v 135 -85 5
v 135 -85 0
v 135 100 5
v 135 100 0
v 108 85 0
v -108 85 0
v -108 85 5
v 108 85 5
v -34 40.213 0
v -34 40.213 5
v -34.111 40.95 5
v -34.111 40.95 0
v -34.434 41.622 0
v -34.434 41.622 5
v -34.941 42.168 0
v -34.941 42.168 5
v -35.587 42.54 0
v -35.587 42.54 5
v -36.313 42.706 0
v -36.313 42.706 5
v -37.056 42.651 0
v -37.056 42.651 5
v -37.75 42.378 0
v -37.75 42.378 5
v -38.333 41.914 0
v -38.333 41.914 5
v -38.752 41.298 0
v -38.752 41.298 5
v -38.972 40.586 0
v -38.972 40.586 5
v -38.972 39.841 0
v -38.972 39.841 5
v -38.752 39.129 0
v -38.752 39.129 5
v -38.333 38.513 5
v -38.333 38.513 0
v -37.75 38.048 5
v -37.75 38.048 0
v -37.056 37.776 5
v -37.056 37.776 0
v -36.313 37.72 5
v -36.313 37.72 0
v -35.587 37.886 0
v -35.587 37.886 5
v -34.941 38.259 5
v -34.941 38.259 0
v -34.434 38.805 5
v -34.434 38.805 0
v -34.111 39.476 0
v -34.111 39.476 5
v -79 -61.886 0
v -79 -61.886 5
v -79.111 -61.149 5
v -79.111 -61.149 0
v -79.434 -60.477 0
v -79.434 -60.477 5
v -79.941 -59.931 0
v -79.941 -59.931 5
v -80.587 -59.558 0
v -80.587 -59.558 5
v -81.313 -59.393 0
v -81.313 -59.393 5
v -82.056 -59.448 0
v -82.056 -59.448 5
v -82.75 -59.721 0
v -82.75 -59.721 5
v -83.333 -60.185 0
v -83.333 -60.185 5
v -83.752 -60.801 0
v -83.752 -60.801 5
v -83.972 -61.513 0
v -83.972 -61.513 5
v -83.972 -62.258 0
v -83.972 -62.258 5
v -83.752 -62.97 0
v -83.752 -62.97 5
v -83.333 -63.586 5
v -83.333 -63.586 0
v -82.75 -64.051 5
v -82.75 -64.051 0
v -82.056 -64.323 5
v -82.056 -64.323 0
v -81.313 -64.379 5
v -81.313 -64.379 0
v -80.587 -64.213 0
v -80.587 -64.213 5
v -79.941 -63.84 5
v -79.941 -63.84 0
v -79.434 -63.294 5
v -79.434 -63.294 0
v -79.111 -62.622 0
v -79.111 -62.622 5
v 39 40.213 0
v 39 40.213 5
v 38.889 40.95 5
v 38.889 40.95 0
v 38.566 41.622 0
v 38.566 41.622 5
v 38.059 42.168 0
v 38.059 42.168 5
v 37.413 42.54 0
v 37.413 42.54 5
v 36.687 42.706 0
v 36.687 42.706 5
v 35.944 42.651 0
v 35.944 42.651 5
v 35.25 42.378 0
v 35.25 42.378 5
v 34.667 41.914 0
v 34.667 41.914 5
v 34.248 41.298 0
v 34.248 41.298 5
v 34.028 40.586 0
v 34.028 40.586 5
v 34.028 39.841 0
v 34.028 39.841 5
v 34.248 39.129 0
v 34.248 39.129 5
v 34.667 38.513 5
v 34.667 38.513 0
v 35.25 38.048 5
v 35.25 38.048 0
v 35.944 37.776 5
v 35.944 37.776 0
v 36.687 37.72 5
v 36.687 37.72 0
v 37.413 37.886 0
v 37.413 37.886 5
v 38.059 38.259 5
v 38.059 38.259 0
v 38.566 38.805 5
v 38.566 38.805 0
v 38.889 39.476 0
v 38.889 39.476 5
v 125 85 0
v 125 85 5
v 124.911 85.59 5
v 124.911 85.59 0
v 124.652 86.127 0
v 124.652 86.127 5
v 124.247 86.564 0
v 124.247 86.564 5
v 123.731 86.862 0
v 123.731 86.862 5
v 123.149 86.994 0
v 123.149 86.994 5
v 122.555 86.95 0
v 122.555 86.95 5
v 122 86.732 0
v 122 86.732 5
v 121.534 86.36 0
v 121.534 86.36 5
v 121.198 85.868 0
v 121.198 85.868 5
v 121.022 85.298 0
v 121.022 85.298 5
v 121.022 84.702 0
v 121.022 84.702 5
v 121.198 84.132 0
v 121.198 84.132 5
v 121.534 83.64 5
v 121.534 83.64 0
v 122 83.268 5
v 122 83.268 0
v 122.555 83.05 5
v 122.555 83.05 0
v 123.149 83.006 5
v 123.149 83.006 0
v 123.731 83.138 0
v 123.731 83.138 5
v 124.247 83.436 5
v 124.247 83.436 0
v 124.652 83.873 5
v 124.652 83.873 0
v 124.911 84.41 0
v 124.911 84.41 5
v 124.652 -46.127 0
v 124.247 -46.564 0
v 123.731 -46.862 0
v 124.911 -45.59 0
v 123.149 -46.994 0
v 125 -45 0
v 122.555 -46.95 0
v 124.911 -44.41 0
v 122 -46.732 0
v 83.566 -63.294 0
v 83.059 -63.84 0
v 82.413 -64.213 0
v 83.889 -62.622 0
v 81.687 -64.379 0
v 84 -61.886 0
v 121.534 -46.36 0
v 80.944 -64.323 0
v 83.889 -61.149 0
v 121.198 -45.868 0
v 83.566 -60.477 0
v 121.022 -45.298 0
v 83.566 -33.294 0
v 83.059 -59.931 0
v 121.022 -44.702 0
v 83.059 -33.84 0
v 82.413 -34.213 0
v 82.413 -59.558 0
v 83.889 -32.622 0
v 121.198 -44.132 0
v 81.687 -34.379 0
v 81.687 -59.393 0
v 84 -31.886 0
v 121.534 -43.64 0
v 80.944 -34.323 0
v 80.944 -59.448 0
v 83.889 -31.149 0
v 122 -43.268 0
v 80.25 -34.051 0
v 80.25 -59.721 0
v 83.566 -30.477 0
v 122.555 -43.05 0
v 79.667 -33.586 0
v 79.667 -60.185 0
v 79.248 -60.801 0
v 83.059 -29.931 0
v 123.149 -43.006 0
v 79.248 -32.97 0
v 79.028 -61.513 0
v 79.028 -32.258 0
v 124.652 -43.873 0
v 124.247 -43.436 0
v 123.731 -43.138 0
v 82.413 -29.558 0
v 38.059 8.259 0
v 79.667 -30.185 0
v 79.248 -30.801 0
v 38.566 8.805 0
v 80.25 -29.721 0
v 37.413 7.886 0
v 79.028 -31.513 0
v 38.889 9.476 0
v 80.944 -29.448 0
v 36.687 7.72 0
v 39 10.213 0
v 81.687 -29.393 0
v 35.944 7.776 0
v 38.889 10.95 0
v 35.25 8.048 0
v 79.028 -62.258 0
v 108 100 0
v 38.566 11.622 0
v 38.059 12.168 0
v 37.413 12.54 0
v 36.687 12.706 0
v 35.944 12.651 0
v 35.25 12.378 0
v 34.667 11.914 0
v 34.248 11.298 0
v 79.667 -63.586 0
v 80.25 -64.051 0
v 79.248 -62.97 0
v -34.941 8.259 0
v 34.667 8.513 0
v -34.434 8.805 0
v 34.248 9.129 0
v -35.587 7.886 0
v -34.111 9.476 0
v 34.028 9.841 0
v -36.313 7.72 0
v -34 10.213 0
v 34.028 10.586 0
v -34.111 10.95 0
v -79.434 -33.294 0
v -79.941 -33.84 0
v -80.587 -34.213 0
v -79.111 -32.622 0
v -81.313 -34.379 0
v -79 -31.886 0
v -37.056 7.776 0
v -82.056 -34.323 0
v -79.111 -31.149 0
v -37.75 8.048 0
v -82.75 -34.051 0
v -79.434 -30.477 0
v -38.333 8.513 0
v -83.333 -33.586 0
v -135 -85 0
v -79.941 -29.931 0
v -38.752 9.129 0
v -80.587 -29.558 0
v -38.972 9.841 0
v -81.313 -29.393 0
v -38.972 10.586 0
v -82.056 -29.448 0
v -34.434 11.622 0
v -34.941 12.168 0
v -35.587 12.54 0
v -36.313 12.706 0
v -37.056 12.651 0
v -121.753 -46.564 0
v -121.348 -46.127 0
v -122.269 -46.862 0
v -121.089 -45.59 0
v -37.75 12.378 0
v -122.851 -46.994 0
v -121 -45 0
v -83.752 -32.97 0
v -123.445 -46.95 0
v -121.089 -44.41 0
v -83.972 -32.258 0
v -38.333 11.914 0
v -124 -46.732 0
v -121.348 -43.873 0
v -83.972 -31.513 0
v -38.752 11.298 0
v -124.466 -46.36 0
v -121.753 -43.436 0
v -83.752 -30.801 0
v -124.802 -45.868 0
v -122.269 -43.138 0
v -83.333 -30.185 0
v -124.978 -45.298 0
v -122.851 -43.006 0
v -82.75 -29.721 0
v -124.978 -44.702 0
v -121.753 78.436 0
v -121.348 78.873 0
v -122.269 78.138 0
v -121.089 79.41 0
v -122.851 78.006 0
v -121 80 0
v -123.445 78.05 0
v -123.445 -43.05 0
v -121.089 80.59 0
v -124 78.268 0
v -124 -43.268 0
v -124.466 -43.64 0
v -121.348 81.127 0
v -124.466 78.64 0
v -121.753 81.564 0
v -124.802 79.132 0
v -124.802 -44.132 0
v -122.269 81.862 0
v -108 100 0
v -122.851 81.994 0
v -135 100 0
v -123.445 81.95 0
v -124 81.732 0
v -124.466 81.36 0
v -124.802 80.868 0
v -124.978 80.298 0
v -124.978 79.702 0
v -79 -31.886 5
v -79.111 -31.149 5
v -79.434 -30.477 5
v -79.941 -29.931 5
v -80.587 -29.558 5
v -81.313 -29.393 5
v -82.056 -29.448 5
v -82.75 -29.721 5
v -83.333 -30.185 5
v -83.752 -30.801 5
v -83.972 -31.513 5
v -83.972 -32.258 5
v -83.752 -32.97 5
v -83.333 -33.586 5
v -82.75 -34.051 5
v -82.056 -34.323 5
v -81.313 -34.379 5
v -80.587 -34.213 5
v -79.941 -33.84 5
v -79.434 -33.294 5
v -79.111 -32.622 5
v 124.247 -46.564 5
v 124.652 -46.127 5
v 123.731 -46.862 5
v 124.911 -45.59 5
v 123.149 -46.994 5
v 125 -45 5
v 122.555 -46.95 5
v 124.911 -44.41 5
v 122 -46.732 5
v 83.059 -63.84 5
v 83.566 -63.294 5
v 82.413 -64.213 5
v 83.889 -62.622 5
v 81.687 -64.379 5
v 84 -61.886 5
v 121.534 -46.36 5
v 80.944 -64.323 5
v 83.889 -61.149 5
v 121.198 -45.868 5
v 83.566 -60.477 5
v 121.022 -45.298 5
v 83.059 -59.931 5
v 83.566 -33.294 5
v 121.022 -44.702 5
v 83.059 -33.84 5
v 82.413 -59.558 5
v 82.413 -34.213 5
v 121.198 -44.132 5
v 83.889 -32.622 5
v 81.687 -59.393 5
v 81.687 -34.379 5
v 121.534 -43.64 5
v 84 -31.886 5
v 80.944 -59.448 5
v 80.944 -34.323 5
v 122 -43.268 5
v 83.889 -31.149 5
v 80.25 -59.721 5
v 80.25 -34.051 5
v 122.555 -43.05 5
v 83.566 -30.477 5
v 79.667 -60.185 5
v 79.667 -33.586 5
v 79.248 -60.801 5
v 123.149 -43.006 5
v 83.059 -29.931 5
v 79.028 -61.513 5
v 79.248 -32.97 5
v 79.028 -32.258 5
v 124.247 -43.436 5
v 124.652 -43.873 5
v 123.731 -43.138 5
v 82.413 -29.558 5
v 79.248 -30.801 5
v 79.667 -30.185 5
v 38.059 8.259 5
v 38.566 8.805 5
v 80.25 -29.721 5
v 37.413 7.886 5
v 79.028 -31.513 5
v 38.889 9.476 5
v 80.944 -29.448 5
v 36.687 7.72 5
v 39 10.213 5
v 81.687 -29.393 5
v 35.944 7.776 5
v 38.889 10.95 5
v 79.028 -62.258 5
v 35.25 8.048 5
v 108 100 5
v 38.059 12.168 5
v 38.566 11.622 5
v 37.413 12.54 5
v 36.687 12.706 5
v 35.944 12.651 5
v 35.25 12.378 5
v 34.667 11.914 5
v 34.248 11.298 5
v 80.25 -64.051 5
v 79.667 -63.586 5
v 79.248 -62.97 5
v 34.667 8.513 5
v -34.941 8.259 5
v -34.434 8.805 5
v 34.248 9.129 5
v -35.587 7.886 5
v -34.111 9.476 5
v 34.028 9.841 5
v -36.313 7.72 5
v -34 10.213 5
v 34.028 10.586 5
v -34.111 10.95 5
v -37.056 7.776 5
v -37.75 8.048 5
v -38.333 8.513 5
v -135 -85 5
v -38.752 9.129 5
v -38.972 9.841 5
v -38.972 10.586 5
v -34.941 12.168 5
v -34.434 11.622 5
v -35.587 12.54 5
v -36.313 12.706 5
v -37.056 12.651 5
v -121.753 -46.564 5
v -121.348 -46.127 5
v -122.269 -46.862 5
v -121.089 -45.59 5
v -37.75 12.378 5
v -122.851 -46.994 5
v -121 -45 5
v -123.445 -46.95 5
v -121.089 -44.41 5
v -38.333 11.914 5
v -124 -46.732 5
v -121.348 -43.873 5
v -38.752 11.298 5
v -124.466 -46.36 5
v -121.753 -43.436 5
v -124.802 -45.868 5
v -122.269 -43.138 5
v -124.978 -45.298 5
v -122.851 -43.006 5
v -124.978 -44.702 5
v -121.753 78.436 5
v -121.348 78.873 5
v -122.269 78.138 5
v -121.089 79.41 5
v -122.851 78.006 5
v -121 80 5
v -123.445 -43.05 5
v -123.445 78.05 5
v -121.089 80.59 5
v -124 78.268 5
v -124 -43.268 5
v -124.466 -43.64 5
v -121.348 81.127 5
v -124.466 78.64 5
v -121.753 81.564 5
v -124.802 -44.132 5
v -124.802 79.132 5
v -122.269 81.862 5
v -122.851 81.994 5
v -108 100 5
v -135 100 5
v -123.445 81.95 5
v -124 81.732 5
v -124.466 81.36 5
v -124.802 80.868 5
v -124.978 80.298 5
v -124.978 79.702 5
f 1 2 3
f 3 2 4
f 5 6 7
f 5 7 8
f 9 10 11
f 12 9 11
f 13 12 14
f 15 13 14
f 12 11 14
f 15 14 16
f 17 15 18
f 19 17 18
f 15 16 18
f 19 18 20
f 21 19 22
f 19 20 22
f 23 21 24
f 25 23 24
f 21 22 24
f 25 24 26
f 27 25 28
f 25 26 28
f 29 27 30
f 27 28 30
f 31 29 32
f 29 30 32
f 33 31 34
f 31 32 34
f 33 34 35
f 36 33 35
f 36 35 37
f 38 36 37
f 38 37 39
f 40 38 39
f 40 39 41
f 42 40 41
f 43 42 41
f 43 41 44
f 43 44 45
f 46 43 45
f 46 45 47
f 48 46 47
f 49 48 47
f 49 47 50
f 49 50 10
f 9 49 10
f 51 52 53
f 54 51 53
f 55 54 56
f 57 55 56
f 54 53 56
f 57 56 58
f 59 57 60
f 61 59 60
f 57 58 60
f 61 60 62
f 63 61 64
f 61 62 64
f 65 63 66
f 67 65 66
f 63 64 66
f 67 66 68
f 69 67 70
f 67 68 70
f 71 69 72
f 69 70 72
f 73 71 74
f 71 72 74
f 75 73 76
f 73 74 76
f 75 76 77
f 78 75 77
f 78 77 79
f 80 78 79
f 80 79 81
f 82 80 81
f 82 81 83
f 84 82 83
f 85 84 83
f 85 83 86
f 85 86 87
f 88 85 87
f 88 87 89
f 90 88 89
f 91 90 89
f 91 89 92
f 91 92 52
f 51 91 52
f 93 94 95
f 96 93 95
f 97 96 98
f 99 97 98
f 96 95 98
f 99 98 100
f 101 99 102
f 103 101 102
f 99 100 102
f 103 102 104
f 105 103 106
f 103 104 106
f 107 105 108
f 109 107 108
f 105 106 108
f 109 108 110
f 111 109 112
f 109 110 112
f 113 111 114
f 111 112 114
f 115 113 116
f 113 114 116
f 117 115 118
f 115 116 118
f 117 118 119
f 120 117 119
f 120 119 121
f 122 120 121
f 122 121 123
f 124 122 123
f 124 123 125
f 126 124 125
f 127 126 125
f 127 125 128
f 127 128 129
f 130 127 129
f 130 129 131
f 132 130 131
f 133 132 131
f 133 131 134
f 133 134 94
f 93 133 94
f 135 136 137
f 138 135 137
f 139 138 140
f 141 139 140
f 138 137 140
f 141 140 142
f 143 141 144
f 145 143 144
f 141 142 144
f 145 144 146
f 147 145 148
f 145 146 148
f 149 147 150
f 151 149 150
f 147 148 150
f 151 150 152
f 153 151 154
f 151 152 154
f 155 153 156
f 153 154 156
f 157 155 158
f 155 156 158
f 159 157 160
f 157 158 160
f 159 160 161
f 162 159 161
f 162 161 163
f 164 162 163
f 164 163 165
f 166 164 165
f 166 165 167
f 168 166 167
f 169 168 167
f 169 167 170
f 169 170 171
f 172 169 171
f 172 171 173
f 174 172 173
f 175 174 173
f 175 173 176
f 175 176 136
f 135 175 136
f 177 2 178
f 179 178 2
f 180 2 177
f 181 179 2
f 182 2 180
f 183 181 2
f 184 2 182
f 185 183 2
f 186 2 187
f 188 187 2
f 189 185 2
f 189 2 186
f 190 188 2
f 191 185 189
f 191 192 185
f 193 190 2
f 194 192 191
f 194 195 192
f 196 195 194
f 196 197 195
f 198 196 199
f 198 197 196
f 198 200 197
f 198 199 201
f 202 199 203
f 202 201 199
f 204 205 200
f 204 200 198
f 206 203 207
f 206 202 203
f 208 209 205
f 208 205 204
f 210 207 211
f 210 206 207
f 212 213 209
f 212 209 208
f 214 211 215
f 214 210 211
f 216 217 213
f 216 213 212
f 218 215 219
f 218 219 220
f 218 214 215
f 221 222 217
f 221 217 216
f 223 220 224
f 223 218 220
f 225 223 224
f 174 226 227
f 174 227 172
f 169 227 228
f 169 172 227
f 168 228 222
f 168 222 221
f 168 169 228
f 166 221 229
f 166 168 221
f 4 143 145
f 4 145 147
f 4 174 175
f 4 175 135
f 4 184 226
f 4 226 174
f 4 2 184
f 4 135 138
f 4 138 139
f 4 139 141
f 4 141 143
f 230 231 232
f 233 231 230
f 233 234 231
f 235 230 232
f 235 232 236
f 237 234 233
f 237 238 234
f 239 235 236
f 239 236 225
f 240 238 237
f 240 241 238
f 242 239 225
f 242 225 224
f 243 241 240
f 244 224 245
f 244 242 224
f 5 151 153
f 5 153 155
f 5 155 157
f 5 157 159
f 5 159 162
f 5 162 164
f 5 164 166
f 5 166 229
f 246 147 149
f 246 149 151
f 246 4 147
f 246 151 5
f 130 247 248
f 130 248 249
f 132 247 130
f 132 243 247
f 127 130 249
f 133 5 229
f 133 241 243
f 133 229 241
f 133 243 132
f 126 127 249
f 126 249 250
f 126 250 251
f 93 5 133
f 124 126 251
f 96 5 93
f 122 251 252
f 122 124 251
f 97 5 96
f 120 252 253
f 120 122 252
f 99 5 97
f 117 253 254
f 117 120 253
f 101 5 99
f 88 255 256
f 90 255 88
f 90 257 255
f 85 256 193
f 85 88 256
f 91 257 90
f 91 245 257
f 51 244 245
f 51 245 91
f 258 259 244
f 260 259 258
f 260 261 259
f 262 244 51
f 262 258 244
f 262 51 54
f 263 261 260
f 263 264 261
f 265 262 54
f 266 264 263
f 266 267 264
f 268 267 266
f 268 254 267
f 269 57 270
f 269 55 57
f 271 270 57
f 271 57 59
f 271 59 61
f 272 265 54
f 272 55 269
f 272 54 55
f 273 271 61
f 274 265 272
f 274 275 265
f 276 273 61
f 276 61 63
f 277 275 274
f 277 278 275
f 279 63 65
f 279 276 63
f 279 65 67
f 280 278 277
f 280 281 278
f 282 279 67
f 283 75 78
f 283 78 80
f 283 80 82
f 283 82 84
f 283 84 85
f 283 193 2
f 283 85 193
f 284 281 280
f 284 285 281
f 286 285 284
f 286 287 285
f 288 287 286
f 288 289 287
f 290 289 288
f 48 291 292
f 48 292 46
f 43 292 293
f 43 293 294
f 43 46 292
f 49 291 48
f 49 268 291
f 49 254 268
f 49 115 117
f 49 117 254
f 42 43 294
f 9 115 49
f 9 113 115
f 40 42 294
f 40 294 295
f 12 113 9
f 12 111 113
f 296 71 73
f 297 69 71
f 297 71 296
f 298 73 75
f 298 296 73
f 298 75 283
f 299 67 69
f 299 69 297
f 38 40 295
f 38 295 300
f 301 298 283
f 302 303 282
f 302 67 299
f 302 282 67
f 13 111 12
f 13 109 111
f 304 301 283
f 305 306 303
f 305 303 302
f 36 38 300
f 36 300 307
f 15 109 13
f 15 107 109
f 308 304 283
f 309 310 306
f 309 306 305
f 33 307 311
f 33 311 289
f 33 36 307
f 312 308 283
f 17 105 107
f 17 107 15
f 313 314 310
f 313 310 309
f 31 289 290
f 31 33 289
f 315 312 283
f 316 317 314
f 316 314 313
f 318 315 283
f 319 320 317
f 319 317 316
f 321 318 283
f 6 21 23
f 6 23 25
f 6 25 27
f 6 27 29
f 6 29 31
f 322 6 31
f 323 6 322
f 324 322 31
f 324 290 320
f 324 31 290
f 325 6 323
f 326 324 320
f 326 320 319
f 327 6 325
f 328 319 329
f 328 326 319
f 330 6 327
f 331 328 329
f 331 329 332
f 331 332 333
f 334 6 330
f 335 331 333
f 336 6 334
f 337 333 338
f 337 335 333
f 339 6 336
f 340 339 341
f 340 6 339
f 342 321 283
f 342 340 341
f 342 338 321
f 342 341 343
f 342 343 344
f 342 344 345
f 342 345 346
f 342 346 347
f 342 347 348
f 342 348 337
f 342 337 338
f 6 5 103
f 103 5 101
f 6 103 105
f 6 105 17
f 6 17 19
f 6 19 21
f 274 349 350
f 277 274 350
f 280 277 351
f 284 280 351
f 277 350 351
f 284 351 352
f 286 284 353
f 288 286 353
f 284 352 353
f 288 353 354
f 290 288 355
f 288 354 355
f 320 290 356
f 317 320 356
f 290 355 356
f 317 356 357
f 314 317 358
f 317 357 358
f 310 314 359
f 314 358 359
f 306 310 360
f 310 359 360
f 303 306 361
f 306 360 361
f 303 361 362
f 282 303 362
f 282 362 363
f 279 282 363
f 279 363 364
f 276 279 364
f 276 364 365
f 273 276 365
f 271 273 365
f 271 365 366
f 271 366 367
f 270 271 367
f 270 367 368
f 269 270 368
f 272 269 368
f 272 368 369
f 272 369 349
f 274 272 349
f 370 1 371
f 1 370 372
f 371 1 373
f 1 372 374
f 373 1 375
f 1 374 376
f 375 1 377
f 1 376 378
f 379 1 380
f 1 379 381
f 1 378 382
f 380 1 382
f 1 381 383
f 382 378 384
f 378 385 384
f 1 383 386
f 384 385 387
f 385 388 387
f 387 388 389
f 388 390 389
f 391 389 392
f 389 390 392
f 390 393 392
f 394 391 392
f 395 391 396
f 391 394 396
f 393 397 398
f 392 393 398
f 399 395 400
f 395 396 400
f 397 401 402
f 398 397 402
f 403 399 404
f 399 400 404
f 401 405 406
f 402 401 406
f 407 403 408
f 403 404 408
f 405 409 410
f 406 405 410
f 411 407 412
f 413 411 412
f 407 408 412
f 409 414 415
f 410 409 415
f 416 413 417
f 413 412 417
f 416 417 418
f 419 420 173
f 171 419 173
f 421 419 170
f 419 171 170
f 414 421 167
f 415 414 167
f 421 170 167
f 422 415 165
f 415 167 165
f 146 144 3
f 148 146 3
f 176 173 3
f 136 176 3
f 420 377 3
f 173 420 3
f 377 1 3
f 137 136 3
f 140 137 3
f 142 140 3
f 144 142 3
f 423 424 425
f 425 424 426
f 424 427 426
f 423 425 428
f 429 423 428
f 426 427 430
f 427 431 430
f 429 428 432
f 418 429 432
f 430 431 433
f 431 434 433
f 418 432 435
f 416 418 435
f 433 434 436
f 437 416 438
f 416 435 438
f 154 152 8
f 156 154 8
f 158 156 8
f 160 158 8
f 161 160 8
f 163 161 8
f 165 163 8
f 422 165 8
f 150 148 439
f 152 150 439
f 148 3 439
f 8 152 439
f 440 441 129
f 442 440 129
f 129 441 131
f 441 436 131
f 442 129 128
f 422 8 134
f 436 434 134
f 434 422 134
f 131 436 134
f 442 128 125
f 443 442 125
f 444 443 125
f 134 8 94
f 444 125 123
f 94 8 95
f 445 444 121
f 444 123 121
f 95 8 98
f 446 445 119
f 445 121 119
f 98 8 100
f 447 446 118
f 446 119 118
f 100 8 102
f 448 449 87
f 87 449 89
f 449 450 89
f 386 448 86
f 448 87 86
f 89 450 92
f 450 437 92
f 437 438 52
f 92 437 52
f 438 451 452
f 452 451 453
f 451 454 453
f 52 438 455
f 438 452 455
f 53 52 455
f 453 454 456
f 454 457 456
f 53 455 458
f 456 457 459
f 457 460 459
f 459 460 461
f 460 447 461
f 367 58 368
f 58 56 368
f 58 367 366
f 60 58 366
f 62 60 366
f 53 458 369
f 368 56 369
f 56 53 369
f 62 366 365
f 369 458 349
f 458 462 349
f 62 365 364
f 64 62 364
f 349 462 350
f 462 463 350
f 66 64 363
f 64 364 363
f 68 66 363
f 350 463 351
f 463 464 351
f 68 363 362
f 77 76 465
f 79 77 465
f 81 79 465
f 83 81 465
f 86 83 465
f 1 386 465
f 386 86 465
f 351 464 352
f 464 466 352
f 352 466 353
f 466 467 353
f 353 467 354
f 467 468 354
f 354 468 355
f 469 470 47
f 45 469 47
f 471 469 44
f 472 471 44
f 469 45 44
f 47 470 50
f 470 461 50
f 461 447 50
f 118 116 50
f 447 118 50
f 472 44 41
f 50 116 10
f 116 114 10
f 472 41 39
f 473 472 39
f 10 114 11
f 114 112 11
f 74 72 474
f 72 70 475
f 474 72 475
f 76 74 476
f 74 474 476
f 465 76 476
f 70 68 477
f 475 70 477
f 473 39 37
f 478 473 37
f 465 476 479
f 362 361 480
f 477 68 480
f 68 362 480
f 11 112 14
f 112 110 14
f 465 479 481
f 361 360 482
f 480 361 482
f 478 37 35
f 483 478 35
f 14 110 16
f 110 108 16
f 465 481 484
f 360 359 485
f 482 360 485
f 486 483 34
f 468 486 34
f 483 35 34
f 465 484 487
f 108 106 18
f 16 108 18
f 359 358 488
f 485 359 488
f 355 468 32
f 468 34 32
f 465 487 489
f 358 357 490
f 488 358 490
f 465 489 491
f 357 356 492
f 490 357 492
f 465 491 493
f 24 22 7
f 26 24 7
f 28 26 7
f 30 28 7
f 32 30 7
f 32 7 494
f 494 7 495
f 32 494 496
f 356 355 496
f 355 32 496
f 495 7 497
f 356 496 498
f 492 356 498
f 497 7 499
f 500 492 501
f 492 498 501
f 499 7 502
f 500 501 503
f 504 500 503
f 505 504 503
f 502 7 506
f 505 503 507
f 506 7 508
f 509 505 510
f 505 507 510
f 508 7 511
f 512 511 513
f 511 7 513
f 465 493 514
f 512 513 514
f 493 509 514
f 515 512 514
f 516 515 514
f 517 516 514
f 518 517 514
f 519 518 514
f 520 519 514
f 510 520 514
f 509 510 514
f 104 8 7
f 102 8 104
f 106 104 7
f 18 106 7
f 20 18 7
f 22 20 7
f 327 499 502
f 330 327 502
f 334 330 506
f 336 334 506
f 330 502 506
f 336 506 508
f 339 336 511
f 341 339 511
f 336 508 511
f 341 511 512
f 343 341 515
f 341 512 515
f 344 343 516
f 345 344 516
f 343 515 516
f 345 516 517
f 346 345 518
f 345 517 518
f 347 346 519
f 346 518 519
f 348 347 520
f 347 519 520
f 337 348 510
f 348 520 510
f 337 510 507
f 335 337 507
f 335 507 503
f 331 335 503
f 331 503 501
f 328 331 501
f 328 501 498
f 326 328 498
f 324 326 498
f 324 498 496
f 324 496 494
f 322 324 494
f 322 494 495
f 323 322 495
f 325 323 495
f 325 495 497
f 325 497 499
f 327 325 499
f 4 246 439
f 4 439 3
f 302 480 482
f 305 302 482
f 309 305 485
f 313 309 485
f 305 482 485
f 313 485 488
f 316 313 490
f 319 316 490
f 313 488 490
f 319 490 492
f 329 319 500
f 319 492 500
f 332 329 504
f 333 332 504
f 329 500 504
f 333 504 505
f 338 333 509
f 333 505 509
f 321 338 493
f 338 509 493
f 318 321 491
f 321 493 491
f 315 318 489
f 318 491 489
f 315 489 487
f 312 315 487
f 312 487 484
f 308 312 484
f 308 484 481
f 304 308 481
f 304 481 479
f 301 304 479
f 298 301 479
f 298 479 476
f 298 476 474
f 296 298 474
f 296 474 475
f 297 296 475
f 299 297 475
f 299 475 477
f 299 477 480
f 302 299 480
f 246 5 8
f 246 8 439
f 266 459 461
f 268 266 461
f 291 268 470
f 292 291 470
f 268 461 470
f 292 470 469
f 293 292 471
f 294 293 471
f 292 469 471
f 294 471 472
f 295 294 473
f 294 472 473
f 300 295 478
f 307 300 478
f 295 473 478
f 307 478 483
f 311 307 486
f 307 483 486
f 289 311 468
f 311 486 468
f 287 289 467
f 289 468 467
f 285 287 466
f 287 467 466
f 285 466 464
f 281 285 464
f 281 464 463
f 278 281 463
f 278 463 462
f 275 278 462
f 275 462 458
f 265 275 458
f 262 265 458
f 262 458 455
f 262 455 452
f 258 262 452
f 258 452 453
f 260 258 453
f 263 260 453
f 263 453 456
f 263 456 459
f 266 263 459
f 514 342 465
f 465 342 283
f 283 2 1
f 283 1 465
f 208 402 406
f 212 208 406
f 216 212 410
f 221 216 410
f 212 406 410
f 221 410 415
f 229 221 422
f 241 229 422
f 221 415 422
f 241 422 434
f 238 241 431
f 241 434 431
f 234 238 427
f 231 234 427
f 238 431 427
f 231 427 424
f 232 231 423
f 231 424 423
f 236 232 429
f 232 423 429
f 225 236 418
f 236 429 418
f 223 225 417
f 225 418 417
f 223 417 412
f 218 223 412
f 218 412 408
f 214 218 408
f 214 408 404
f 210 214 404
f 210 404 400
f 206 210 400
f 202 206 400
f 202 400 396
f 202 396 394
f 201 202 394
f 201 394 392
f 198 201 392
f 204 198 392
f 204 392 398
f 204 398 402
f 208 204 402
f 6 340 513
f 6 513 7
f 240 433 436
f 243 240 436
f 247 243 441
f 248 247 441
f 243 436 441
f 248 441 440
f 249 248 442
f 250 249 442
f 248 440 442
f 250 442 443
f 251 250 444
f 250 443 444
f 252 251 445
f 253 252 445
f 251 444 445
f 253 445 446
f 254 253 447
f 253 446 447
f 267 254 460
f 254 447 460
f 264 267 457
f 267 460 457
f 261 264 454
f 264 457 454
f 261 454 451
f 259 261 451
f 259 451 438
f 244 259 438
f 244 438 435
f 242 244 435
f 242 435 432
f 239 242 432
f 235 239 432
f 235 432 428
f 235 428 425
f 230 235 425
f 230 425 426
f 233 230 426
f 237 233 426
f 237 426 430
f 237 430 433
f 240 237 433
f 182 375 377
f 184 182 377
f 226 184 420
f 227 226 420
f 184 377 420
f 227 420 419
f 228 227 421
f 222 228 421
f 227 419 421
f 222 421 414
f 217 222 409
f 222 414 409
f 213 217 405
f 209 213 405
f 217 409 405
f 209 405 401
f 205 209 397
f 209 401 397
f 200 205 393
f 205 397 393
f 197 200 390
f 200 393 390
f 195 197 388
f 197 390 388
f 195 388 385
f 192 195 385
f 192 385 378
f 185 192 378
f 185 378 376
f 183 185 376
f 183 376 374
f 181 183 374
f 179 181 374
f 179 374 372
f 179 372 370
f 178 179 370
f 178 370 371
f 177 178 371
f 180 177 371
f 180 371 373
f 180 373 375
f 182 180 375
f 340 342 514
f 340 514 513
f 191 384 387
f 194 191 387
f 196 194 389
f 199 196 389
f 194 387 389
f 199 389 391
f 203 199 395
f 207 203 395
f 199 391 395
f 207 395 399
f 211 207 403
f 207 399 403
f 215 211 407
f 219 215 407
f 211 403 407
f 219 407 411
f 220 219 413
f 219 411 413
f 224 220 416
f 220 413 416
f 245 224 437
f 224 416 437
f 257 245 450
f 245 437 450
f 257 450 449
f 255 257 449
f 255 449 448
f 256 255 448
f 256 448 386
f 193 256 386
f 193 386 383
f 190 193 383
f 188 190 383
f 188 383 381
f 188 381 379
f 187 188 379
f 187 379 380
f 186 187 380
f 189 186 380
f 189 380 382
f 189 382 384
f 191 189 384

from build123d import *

# Parameters (mm, degrees)
BOSS_EXTRU_1_DEPTH      = 5
ESQUISSE2_R             = 2
ENL_V_MAT_EXTRU_1_DEPTH = 169.07736314
SKETCH1_R               = 2.5
CUT_EXTRUDE1_DEPTH      = 169.07736314
SKETCH2_R               = 2.5
CUT_EXTRUDE2_DEPTH      = 24


with BuildPart() as part:
    # Esquisse1 → Boss.-Extru.1 (new body)
    with BuildSketch(Plane.XY):
        Polygon((-135, 85), (-135, 100), (-108, 100), (-108, 85), (108, 85), (108, 100), (135, 100), (135, 85), (135, -85), (-135, -85), align=None)
    extrude(amount=BOSS_EXTRU_1_DEPTH)

    # Esquisse2 → Enlèv. mat.-Extru.1 (cut, through all)
    with BuildSketch(Plane.XY.offset(5)):
        with Locations((-123, -45)):
            Circle(ESQUISSE2_R)
        with Locations((-123, 80)):
            Circle(ESQUISSE2_R)
        with Locations((123, -45)):
            Circle(ESQUISSE2_R)
        with Locations((123, 85)):
            Circle(ESQUISSE2_R)
    extrude(amount=-ENL_V_MAT_EXTRU_1_DEPTH, mode=Mode.SUBTRACT)

    # Sketch1 → Cut-Extrude1 (cut, through all)
    with BuildSketch(Plane.XY.offset(5)):
        with Locations((81.5, -31.885578019)):
            Circle(SKETCH1_R)
        with Locations((81.5, -61.885578019)):
            Circle(SKETCH1_R)
        with Locations((-81.5, -61.885578019)):
            Circle(SKETCH1_R)
        with Locations((-81.5, -31.885578019)):
            Circle(SKETCH1_R)
    extrude(amount=-CUT_EXTRUDE1_DEPTH, mode=Mode.SUBTRACT)

    # Sketch2 → Cut-Extrude2 (cut)
    with BuildSketch(Plane.XY.offset(5)):
        with Locations((36.5, 40.213230892)):
            Circle(SKETCH2_R)
        with Locations((36.5, 10.213230892)):
            Circle(SKETCH2_R)
        with Locations((-36.5, 10.213230892)):
            Circle(SKETCH2_R)
        with Locations((-36.5, 40.213230892)):
            Circle(SKETCH2_R)
    extrude(amount=-CUT_EXTRUDE2_DEPTH, mode=Mode.SUBTRACT)


solid = part.part
